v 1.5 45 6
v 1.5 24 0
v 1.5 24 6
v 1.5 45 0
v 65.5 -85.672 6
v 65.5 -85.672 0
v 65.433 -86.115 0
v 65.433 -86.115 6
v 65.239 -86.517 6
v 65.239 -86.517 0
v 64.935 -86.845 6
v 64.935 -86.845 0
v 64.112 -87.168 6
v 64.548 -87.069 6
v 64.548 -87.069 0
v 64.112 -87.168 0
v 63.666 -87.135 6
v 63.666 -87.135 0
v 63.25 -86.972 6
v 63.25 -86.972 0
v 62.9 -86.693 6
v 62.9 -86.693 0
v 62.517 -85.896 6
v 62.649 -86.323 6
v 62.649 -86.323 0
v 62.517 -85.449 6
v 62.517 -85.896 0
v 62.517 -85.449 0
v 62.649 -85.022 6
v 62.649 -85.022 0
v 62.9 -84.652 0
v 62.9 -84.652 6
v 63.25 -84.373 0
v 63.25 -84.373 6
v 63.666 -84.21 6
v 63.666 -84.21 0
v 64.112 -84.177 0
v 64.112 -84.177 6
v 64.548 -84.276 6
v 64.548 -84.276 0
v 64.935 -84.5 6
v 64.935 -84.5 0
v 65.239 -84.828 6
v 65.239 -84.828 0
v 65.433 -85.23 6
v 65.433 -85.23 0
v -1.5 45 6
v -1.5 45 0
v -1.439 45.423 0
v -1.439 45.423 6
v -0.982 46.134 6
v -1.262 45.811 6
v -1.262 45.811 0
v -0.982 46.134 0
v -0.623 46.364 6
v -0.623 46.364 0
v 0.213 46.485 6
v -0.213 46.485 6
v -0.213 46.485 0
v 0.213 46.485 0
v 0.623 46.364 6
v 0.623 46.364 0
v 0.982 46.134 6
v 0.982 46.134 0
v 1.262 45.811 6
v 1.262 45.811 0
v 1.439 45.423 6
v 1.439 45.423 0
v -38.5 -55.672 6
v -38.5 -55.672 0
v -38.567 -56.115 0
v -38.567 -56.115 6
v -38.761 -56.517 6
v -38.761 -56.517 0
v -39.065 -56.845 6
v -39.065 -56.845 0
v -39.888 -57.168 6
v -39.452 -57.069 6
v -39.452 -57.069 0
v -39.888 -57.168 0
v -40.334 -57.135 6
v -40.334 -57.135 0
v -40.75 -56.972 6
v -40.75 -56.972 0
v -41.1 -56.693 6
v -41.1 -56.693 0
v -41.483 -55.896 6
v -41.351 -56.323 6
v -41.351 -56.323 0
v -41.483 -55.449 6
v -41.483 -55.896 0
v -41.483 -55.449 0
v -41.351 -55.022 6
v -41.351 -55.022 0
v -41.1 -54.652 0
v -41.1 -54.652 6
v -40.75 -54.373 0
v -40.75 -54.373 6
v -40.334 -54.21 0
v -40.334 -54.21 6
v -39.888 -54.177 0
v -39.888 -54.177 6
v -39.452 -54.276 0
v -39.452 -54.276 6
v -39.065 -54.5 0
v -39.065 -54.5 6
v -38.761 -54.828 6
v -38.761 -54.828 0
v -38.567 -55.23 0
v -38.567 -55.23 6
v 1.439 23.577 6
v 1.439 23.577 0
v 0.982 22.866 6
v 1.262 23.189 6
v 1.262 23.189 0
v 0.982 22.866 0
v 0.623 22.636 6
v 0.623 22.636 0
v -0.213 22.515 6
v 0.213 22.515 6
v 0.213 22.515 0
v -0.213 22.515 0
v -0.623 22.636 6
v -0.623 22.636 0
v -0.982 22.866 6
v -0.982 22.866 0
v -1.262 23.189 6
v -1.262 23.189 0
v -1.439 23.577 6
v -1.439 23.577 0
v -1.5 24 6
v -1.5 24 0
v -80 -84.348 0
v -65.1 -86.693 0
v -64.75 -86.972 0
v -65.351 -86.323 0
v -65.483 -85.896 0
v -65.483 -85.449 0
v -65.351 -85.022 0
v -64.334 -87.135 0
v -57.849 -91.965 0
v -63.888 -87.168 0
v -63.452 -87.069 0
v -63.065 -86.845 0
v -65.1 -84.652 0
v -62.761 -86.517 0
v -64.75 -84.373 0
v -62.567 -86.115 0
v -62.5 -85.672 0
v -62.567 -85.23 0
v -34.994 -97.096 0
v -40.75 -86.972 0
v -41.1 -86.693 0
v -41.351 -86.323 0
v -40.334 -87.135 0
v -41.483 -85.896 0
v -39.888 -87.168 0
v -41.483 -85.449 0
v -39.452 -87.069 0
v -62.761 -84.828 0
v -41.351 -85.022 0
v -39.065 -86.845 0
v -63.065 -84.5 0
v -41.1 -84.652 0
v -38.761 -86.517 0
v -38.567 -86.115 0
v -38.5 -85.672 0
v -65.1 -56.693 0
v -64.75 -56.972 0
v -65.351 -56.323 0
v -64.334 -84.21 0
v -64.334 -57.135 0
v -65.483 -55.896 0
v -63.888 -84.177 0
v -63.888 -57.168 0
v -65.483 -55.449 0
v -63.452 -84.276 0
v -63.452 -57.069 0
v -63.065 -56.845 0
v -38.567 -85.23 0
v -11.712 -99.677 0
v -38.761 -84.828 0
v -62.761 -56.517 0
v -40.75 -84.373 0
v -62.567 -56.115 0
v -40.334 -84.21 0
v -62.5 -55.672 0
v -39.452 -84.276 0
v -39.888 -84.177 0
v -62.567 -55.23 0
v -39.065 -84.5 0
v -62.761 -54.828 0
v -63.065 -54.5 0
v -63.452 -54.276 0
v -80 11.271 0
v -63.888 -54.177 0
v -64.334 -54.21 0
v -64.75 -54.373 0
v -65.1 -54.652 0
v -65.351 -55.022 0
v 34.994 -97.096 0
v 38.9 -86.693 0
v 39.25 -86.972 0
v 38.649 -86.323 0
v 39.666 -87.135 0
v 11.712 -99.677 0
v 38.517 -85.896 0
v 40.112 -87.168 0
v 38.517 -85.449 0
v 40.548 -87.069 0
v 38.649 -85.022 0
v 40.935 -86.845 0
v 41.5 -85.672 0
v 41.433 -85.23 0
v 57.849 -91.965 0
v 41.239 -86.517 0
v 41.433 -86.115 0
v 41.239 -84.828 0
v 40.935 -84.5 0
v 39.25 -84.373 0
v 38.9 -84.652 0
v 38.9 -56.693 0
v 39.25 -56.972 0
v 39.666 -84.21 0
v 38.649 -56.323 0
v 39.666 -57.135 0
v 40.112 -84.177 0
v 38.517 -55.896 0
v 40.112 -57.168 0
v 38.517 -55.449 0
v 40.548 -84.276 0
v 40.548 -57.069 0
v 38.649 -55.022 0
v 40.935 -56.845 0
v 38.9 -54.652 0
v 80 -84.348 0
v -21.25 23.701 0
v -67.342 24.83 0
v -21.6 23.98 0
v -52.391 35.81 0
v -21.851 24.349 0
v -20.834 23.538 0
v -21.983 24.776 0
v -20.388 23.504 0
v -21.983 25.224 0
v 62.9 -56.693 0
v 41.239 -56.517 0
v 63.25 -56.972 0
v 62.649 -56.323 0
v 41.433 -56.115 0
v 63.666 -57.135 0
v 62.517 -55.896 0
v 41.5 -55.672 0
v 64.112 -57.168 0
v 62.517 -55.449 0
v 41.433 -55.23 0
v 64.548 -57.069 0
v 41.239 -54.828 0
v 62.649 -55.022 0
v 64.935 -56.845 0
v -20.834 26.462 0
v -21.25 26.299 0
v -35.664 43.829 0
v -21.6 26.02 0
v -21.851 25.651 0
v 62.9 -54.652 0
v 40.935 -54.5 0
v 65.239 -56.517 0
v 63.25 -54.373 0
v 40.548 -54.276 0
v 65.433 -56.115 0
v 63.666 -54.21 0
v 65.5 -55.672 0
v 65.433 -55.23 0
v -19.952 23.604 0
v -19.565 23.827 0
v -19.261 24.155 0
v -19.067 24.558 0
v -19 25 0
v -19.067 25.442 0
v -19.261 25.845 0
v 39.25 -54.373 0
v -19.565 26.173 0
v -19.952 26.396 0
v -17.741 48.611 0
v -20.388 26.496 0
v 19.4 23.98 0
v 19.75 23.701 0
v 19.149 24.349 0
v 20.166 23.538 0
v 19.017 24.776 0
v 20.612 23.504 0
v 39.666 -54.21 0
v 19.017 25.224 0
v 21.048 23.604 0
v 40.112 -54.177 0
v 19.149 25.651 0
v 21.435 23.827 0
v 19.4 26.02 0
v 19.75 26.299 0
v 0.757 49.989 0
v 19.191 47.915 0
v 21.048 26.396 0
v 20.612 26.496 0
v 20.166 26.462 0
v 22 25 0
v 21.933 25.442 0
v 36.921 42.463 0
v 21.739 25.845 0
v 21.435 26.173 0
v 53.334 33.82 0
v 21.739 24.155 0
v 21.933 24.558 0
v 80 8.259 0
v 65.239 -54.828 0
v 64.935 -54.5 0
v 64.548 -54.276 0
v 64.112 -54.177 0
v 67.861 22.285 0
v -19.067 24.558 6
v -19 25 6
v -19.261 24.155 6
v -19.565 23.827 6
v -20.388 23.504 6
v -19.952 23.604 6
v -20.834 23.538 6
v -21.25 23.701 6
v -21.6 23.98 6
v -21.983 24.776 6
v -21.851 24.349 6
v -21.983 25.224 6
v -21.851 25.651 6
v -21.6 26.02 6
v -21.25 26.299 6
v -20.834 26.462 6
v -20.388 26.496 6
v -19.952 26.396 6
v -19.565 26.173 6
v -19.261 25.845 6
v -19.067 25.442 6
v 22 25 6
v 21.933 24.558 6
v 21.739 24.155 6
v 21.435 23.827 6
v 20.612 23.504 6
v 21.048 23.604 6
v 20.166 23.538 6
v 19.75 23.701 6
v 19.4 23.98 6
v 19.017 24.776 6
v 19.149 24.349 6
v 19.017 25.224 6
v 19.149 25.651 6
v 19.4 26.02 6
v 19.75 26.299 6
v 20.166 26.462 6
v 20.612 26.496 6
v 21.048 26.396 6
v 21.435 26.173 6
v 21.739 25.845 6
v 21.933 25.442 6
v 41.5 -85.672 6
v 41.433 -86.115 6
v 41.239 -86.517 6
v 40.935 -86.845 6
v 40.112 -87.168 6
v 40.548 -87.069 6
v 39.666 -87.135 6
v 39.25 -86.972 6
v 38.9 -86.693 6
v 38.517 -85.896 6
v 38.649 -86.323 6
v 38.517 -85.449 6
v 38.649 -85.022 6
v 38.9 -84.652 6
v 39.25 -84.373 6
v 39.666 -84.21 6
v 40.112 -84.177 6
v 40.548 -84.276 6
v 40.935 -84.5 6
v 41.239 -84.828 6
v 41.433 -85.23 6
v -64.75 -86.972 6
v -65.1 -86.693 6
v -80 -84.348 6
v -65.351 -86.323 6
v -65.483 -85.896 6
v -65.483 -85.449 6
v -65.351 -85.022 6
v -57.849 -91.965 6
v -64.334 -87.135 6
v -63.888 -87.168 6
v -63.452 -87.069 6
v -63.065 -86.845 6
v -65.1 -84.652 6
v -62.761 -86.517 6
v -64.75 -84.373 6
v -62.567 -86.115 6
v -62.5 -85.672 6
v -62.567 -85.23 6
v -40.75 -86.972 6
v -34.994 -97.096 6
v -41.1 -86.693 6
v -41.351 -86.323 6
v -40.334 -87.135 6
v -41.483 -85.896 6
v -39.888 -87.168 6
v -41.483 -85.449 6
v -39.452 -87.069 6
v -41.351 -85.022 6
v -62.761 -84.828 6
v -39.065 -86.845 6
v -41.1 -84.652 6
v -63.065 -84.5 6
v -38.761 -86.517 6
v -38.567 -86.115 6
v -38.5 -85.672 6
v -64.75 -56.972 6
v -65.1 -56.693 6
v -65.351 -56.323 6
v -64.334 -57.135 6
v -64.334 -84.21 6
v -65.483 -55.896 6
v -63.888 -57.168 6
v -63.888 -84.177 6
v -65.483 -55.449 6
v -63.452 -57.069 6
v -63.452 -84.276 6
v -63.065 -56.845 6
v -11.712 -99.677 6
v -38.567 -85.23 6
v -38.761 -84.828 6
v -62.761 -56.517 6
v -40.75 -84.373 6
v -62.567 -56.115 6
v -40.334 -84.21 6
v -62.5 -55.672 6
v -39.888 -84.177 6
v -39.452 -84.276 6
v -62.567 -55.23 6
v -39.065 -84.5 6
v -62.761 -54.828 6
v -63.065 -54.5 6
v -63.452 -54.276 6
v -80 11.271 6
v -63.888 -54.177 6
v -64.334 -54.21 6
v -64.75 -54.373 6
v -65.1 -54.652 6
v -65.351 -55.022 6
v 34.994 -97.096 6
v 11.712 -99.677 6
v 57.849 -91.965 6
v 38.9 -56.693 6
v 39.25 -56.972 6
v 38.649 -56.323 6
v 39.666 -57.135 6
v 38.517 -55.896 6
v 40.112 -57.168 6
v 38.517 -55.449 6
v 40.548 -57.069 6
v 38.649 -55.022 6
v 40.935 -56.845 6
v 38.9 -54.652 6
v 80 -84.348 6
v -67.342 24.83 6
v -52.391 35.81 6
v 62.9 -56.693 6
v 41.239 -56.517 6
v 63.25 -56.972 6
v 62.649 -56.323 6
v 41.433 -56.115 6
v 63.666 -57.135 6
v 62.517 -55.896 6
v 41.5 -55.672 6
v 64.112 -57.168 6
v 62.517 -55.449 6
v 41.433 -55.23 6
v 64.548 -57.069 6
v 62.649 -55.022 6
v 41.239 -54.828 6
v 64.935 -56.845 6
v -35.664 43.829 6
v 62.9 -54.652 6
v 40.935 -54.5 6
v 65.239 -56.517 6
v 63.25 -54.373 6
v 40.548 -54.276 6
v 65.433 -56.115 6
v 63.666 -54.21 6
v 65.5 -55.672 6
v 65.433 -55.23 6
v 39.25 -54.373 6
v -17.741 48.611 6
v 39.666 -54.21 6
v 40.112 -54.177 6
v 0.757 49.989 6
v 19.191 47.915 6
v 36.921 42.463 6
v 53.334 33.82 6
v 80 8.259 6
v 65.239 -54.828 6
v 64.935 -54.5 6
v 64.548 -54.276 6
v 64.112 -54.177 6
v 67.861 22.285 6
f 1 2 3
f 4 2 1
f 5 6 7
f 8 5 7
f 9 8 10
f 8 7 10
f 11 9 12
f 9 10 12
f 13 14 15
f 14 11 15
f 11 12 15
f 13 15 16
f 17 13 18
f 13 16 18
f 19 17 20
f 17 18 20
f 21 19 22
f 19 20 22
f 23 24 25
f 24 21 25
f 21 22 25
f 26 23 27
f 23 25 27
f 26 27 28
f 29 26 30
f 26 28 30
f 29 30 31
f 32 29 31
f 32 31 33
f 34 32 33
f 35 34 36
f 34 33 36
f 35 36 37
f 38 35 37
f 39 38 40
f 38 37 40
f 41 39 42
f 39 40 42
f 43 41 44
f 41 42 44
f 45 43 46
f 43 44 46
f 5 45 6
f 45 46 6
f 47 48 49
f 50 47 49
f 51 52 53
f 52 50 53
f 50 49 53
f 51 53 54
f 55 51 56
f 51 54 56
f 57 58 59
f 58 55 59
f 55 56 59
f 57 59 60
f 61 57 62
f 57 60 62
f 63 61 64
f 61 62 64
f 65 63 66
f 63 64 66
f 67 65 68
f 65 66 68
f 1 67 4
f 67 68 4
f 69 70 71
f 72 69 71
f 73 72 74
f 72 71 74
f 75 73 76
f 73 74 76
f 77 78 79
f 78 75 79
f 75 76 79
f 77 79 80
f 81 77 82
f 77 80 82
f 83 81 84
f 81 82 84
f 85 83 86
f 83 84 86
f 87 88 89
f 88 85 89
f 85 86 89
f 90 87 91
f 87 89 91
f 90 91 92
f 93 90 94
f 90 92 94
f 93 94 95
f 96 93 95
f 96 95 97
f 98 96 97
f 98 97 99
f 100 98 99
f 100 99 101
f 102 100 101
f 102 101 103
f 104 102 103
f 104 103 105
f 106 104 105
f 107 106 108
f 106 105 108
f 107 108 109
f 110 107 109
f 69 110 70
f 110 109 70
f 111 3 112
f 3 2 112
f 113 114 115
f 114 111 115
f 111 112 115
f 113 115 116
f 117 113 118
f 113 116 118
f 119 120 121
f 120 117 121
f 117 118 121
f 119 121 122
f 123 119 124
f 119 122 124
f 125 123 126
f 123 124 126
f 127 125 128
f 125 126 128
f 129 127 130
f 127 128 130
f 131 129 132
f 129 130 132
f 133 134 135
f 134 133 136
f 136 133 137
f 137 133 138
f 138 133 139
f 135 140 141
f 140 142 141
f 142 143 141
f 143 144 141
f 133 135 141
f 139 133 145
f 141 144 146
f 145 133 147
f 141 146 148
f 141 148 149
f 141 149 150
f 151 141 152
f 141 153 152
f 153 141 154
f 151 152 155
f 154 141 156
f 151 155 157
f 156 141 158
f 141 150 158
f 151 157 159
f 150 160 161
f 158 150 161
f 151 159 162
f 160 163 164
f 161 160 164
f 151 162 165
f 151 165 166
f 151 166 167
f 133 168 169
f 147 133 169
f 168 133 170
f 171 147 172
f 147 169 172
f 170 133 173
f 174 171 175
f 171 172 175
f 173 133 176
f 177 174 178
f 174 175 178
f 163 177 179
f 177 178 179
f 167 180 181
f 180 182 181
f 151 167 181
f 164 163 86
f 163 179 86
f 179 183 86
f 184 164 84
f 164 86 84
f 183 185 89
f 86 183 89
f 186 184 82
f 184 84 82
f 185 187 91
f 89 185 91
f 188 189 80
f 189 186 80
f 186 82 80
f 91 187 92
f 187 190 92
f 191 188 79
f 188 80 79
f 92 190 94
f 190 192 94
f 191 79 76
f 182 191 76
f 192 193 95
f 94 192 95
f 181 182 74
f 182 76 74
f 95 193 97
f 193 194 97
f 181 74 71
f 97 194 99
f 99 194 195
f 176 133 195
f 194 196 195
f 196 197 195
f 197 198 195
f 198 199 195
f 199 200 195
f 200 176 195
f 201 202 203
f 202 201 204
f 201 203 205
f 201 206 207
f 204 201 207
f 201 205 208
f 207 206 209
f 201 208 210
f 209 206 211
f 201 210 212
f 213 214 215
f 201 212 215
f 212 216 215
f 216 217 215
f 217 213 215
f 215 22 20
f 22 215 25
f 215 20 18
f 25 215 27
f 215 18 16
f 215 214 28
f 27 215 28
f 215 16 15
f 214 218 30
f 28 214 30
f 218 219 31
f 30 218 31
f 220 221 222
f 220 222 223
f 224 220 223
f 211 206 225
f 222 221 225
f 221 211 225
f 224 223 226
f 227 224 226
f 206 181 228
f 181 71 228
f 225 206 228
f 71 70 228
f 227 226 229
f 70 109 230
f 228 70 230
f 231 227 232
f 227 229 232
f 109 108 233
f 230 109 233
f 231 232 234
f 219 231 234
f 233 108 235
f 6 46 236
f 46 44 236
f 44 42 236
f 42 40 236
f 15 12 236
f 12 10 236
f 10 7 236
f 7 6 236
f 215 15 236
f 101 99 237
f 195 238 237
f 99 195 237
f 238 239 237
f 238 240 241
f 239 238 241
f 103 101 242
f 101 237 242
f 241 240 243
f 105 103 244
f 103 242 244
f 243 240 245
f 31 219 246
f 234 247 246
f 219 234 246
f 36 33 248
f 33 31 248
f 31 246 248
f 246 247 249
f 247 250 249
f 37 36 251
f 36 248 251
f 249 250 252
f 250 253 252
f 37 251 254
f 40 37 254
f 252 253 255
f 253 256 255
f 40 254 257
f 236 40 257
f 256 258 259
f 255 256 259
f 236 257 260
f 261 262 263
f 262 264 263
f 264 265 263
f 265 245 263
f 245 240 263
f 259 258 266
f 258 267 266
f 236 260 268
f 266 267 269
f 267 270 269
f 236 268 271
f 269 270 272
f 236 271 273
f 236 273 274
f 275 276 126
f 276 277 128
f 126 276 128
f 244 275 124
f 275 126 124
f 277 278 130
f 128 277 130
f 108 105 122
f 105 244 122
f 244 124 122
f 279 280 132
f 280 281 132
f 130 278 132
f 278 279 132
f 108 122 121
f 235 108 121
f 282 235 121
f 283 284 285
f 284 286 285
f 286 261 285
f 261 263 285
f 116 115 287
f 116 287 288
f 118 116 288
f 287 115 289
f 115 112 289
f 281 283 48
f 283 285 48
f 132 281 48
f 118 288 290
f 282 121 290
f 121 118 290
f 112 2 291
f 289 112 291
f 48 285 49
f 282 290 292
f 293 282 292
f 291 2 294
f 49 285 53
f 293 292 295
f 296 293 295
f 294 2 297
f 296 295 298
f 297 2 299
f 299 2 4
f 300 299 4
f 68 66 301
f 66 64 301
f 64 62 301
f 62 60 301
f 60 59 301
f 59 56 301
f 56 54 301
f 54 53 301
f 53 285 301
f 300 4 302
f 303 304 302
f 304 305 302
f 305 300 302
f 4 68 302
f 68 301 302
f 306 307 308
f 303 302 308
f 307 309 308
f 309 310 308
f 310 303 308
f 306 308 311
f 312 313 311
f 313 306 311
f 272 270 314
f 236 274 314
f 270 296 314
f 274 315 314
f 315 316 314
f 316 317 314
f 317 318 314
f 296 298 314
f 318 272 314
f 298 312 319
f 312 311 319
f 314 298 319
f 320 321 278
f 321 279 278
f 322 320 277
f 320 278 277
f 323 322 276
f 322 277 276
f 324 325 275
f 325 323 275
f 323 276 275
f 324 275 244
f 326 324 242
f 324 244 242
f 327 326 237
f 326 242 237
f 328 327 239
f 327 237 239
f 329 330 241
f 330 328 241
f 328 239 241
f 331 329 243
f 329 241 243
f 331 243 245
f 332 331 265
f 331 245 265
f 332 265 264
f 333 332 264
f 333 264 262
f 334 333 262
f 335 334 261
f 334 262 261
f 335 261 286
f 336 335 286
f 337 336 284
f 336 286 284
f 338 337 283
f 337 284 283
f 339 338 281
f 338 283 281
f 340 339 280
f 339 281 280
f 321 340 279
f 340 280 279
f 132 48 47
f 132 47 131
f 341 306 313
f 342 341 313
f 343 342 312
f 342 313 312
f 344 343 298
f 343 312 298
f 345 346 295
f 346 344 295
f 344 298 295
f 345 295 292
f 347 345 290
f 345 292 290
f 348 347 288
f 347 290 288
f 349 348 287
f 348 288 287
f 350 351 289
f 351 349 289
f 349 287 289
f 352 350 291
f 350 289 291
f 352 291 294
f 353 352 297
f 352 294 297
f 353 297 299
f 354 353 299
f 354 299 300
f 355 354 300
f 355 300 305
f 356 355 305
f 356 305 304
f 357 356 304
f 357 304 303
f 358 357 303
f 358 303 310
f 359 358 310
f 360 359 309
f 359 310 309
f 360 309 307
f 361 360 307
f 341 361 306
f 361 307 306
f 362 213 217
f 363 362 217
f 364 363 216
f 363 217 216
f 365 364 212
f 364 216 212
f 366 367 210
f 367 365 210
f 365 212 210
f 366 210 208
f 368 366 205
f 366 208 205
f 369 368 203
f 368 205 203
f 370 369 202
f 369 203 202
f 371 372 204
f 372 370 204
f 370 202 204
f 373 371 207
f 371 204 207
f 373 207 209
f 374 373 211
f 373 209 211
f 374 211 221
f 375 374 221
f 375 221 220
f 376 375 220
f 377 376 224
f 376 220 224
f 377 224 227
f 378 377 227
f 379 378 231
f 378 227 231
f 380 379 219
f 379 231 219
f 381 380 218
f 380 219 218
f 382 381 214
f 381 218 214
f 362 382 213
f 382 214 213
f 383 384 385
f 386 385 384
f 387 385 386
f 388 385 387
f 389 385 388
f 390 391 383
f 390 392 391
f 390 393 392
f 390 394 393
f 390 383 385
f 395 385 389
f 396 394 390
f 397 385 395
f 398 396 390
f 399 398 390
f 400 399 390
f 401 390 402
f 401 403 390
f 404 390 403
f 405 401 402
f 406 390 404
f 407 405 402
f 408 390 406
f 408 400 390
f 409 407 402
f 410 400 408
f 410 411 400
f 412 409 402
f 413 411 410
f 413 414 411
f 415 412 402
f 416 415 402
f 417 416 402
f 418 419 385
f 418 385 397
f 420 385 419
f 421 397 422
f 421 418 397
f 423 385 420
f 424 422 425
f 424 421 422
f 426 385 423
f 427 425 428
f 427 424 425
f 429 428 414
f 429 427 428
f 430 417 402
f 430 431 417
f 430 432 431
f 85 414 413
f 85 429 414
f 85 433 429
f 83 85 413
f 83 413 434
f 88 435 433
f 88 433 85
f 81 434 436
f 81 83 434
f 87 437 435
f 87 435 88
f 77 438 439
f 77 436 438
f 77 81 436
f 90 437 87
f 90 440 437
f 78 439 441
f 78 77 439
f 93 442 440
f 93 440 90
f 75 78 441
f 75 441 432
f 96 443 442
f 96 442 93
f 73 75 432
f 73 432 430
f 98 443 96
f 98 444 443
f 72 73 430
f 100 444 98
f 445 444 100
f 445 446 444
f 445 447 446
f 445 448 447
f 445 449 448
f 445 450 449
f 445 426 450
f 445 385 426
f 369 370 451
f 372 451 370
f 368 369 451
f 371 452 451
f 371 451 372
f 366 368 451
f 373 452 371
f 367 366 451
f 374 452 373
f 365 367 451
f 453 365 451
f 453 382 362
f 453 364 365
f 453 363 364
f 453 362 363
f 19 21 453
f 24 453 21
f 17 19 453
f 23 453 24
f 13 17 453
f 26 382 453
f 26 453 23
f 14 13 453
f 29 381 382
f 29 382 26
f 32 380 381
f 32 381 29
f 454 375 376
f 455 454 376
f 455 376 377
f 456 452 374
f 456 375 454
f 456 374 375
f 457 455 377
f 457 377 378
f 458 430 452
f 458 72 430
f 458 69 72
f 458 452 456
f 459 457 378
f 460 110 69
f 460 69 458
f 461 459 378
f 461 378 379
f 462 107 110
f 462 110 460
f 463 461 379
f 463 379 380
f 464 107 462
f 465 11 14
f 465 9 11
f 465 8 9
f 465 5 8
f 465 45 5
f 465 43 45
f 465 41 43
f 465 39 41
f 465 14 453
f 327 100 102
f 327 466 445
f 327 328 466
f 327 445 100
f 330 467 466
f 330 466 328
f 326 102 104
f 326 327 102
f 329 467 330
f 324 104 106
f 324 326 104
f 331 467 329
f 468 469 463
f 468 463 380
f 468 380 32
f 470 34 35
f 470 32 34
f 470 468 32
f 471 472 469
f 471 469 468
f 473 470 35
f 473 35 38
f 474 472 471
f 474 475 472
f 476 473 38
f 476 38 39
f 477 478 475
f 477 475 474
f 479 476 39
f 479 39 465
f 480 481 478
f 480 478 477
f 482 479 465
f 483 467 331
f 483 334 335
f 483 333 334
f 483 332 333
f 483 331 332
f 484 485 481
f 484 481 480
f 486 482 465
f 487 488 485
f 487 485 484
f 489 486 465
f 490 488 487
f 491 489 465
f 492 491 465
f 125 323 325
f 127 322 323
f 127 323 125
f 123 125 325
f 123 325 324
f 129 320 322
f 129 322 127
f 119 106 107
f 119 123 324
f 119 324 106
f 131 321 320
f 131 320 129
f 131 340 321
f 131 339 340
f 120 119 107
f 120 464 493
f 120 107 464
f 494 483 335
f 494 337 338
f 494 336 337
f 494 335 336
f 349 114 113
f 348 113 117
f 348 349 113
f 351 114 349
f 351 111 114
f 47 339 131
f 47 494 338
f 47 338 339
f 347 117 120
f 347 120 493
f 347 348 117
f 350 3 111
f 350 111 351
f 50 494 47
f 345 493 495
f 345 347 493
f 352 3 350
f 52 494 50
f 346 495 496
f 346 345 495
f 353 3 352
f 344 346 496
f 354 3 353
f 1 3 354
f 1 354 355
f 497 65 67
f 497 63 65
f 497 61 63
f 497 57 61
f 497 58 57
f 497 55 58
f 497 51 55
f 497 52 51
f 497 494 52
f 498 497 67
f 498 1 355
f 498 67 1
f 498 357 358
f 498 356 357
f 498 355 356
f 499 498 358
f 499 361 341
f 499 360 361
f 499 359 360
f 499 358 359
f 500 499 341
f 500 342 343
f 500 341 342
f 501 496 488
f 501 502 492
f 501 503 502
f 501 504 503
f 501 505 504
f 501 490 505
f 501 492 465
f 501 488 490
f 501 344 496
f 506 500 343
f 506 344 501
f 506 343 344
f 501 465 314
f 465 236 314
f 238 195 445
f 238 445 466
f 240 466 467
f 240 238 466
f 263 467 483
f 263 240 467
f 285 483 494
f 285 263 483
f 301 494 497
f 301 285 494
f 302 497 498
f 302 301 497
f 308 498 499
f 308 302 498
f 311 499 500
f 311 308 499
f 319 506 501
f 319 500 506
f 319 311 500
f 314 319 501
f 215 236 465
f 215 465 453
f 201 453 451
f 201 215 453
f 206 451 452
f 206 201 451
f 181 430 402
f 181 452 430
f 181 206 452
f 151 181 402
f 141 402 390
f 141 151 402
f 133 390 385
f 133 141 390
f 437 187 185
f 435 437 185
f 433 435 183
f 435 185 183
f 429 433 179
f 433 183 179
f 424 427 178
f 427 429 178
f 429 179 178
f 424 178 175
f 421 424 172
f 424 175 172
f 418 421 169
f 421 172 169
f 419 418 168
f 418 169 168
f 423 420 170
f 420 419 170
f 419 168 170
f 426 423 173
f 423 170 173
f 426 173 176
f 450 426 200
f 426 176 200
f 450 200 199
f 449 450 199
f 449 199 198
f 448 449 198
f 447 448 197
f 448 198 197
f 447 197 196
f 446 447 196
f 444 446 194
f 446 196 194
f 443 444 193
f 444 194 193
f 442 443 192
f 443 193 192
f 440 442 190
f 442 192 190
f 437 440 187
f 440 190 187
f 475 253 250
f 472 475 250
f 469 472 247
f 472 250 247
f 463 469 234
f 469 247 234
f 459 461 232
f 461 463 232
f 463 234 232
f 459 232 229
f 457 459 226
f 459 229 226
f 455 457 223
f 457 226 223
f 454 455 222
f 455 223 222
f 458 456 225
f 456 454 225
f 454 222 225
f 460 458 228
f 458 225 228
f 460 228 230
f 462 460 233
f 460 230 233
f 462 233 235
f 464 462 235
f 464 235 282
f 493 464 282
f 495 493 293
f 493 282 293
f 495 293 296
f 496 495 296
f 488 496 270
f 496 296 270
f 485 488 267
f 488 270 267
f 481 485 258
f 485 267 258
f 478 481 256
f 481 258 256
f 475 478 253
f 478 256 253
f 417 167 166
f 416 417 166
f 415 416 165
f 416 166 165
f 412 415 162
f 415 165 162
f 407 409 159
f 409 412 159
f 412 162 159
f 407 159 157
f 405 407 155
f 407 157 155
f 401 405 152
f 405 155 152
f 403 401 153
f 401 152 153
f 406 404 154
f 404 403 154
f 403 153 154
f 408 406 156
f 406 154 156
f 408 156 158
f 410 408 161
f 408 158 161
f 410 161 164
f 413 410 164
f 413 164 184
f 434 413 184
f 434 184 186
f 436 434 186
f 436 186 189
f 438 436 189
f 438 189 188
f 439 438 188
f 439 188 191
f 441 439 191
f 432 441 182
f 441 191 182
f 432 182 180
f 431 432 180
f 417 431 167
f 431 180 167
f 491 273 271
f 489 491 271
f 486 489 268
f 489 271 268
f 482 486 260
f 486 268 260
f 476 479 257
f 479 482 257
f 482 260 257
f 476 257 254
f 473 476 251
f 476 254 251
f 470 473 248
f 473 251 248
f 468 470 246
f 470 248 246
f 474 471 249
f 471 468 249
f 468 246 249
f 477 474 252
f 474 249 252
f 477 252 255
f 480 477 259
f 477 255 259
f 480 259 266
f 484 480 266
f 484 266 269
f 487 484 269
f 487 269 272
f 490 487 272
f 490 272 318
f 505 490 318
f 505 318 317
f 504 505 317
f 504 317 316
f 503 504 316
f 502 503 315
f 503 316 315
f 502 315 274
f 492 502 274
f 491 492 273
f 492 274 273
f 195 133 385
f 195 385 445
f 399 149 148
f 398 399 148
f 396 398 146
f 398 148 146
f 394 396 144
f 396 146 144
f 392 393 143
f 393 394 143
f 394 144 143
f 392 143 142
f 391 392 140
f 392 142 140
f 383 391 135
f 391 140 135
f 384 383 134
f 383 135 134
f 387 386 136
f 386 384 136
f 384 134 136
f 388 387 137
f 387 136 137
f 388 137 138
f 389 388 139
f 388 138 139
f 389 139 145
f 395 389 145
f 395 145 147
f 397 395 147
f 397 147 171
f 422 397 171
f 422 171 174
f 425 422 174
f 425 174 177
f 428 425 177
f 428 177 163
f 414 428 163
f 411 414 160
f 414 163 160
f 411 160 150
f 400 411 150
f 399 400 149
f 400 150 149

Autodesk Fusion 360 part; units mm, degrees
sketch "草图1" plane through (0, 0, 0) normal (0, 0, 1) x (1, 0, 0)
  line L0 (-80, -84.3478) -> (-80, 11.2707)
  line L1 (80, -84.3478) -> (80, 8.2588)
  circle A0 centre (-64, -85.6725) radius 1.5
  circle A1 centre (-40, -85.6725) radius 1.5
  circle A2 centre (-64, -55.6725) radius 1.5
  circle A3 centre (-40, -55.6725) radius 1.5
  circle A4 centre (40, -55.6725) radius 1.5
  circle A5 centre (64, -55.6725) radius 1.5
  circle A6 centre (40, -85.6725) radius 1.5
  circle A7 centre (64, -85.6725) radius 1.5
  circle A8 centre (-20.5, 25) radius 1.5
  circle A9 centre (20.5, 25) radius 1.5
  line L2 (-1.5, 45) -> (-1.5, 24)
  arc A10 (-1.5, 24) -> (1.5, 24) centre (0, 24) ccw
  line L3 (1.5, 24) -> (1.5, 45)
  arc A11 (1.5, 45) -> (-1.5, 45) centre (0, 45) ccw
  line L4 (0, 46.5) -> (0, 22.5) construction
  arc A12 (80, 8.2588) -> (-80, 11.2707) centre (-1.119, -49.6781) ccw
  arc A13 (-80, -84.3478) -> (80, -84.3478) centre (0, 112.2701) ccw
  point P0 (0, 50)
  dimension "d4" = 3
  dimension "d7" = 24
  dimension "d8" = 30
  dimension "d9" = 40
  dimension "d10" = 3
  dimension "d11" = 30
  dimension "d14" = 24
  dimension "d15" = -30
  dimension "d16" = 40
  dimension "d17" = 3
  dimension "d22" = 20.5
  dimension "d24" = 20.5
  dimension "d25" = 41
  dimension "d26" = 3
  dimension "d29" = 80
  dimension "d30" = 80
  dimension "d33" = 5
extrude "拉伸1" add sketch "草图1" along normal blind 2
extrude "拉伸2" add sketch "草图1" along normal blind 6
equation "d22 = 19 mm + 1.5 mm"
equation "d25 = 38 mm + 3 mm"
